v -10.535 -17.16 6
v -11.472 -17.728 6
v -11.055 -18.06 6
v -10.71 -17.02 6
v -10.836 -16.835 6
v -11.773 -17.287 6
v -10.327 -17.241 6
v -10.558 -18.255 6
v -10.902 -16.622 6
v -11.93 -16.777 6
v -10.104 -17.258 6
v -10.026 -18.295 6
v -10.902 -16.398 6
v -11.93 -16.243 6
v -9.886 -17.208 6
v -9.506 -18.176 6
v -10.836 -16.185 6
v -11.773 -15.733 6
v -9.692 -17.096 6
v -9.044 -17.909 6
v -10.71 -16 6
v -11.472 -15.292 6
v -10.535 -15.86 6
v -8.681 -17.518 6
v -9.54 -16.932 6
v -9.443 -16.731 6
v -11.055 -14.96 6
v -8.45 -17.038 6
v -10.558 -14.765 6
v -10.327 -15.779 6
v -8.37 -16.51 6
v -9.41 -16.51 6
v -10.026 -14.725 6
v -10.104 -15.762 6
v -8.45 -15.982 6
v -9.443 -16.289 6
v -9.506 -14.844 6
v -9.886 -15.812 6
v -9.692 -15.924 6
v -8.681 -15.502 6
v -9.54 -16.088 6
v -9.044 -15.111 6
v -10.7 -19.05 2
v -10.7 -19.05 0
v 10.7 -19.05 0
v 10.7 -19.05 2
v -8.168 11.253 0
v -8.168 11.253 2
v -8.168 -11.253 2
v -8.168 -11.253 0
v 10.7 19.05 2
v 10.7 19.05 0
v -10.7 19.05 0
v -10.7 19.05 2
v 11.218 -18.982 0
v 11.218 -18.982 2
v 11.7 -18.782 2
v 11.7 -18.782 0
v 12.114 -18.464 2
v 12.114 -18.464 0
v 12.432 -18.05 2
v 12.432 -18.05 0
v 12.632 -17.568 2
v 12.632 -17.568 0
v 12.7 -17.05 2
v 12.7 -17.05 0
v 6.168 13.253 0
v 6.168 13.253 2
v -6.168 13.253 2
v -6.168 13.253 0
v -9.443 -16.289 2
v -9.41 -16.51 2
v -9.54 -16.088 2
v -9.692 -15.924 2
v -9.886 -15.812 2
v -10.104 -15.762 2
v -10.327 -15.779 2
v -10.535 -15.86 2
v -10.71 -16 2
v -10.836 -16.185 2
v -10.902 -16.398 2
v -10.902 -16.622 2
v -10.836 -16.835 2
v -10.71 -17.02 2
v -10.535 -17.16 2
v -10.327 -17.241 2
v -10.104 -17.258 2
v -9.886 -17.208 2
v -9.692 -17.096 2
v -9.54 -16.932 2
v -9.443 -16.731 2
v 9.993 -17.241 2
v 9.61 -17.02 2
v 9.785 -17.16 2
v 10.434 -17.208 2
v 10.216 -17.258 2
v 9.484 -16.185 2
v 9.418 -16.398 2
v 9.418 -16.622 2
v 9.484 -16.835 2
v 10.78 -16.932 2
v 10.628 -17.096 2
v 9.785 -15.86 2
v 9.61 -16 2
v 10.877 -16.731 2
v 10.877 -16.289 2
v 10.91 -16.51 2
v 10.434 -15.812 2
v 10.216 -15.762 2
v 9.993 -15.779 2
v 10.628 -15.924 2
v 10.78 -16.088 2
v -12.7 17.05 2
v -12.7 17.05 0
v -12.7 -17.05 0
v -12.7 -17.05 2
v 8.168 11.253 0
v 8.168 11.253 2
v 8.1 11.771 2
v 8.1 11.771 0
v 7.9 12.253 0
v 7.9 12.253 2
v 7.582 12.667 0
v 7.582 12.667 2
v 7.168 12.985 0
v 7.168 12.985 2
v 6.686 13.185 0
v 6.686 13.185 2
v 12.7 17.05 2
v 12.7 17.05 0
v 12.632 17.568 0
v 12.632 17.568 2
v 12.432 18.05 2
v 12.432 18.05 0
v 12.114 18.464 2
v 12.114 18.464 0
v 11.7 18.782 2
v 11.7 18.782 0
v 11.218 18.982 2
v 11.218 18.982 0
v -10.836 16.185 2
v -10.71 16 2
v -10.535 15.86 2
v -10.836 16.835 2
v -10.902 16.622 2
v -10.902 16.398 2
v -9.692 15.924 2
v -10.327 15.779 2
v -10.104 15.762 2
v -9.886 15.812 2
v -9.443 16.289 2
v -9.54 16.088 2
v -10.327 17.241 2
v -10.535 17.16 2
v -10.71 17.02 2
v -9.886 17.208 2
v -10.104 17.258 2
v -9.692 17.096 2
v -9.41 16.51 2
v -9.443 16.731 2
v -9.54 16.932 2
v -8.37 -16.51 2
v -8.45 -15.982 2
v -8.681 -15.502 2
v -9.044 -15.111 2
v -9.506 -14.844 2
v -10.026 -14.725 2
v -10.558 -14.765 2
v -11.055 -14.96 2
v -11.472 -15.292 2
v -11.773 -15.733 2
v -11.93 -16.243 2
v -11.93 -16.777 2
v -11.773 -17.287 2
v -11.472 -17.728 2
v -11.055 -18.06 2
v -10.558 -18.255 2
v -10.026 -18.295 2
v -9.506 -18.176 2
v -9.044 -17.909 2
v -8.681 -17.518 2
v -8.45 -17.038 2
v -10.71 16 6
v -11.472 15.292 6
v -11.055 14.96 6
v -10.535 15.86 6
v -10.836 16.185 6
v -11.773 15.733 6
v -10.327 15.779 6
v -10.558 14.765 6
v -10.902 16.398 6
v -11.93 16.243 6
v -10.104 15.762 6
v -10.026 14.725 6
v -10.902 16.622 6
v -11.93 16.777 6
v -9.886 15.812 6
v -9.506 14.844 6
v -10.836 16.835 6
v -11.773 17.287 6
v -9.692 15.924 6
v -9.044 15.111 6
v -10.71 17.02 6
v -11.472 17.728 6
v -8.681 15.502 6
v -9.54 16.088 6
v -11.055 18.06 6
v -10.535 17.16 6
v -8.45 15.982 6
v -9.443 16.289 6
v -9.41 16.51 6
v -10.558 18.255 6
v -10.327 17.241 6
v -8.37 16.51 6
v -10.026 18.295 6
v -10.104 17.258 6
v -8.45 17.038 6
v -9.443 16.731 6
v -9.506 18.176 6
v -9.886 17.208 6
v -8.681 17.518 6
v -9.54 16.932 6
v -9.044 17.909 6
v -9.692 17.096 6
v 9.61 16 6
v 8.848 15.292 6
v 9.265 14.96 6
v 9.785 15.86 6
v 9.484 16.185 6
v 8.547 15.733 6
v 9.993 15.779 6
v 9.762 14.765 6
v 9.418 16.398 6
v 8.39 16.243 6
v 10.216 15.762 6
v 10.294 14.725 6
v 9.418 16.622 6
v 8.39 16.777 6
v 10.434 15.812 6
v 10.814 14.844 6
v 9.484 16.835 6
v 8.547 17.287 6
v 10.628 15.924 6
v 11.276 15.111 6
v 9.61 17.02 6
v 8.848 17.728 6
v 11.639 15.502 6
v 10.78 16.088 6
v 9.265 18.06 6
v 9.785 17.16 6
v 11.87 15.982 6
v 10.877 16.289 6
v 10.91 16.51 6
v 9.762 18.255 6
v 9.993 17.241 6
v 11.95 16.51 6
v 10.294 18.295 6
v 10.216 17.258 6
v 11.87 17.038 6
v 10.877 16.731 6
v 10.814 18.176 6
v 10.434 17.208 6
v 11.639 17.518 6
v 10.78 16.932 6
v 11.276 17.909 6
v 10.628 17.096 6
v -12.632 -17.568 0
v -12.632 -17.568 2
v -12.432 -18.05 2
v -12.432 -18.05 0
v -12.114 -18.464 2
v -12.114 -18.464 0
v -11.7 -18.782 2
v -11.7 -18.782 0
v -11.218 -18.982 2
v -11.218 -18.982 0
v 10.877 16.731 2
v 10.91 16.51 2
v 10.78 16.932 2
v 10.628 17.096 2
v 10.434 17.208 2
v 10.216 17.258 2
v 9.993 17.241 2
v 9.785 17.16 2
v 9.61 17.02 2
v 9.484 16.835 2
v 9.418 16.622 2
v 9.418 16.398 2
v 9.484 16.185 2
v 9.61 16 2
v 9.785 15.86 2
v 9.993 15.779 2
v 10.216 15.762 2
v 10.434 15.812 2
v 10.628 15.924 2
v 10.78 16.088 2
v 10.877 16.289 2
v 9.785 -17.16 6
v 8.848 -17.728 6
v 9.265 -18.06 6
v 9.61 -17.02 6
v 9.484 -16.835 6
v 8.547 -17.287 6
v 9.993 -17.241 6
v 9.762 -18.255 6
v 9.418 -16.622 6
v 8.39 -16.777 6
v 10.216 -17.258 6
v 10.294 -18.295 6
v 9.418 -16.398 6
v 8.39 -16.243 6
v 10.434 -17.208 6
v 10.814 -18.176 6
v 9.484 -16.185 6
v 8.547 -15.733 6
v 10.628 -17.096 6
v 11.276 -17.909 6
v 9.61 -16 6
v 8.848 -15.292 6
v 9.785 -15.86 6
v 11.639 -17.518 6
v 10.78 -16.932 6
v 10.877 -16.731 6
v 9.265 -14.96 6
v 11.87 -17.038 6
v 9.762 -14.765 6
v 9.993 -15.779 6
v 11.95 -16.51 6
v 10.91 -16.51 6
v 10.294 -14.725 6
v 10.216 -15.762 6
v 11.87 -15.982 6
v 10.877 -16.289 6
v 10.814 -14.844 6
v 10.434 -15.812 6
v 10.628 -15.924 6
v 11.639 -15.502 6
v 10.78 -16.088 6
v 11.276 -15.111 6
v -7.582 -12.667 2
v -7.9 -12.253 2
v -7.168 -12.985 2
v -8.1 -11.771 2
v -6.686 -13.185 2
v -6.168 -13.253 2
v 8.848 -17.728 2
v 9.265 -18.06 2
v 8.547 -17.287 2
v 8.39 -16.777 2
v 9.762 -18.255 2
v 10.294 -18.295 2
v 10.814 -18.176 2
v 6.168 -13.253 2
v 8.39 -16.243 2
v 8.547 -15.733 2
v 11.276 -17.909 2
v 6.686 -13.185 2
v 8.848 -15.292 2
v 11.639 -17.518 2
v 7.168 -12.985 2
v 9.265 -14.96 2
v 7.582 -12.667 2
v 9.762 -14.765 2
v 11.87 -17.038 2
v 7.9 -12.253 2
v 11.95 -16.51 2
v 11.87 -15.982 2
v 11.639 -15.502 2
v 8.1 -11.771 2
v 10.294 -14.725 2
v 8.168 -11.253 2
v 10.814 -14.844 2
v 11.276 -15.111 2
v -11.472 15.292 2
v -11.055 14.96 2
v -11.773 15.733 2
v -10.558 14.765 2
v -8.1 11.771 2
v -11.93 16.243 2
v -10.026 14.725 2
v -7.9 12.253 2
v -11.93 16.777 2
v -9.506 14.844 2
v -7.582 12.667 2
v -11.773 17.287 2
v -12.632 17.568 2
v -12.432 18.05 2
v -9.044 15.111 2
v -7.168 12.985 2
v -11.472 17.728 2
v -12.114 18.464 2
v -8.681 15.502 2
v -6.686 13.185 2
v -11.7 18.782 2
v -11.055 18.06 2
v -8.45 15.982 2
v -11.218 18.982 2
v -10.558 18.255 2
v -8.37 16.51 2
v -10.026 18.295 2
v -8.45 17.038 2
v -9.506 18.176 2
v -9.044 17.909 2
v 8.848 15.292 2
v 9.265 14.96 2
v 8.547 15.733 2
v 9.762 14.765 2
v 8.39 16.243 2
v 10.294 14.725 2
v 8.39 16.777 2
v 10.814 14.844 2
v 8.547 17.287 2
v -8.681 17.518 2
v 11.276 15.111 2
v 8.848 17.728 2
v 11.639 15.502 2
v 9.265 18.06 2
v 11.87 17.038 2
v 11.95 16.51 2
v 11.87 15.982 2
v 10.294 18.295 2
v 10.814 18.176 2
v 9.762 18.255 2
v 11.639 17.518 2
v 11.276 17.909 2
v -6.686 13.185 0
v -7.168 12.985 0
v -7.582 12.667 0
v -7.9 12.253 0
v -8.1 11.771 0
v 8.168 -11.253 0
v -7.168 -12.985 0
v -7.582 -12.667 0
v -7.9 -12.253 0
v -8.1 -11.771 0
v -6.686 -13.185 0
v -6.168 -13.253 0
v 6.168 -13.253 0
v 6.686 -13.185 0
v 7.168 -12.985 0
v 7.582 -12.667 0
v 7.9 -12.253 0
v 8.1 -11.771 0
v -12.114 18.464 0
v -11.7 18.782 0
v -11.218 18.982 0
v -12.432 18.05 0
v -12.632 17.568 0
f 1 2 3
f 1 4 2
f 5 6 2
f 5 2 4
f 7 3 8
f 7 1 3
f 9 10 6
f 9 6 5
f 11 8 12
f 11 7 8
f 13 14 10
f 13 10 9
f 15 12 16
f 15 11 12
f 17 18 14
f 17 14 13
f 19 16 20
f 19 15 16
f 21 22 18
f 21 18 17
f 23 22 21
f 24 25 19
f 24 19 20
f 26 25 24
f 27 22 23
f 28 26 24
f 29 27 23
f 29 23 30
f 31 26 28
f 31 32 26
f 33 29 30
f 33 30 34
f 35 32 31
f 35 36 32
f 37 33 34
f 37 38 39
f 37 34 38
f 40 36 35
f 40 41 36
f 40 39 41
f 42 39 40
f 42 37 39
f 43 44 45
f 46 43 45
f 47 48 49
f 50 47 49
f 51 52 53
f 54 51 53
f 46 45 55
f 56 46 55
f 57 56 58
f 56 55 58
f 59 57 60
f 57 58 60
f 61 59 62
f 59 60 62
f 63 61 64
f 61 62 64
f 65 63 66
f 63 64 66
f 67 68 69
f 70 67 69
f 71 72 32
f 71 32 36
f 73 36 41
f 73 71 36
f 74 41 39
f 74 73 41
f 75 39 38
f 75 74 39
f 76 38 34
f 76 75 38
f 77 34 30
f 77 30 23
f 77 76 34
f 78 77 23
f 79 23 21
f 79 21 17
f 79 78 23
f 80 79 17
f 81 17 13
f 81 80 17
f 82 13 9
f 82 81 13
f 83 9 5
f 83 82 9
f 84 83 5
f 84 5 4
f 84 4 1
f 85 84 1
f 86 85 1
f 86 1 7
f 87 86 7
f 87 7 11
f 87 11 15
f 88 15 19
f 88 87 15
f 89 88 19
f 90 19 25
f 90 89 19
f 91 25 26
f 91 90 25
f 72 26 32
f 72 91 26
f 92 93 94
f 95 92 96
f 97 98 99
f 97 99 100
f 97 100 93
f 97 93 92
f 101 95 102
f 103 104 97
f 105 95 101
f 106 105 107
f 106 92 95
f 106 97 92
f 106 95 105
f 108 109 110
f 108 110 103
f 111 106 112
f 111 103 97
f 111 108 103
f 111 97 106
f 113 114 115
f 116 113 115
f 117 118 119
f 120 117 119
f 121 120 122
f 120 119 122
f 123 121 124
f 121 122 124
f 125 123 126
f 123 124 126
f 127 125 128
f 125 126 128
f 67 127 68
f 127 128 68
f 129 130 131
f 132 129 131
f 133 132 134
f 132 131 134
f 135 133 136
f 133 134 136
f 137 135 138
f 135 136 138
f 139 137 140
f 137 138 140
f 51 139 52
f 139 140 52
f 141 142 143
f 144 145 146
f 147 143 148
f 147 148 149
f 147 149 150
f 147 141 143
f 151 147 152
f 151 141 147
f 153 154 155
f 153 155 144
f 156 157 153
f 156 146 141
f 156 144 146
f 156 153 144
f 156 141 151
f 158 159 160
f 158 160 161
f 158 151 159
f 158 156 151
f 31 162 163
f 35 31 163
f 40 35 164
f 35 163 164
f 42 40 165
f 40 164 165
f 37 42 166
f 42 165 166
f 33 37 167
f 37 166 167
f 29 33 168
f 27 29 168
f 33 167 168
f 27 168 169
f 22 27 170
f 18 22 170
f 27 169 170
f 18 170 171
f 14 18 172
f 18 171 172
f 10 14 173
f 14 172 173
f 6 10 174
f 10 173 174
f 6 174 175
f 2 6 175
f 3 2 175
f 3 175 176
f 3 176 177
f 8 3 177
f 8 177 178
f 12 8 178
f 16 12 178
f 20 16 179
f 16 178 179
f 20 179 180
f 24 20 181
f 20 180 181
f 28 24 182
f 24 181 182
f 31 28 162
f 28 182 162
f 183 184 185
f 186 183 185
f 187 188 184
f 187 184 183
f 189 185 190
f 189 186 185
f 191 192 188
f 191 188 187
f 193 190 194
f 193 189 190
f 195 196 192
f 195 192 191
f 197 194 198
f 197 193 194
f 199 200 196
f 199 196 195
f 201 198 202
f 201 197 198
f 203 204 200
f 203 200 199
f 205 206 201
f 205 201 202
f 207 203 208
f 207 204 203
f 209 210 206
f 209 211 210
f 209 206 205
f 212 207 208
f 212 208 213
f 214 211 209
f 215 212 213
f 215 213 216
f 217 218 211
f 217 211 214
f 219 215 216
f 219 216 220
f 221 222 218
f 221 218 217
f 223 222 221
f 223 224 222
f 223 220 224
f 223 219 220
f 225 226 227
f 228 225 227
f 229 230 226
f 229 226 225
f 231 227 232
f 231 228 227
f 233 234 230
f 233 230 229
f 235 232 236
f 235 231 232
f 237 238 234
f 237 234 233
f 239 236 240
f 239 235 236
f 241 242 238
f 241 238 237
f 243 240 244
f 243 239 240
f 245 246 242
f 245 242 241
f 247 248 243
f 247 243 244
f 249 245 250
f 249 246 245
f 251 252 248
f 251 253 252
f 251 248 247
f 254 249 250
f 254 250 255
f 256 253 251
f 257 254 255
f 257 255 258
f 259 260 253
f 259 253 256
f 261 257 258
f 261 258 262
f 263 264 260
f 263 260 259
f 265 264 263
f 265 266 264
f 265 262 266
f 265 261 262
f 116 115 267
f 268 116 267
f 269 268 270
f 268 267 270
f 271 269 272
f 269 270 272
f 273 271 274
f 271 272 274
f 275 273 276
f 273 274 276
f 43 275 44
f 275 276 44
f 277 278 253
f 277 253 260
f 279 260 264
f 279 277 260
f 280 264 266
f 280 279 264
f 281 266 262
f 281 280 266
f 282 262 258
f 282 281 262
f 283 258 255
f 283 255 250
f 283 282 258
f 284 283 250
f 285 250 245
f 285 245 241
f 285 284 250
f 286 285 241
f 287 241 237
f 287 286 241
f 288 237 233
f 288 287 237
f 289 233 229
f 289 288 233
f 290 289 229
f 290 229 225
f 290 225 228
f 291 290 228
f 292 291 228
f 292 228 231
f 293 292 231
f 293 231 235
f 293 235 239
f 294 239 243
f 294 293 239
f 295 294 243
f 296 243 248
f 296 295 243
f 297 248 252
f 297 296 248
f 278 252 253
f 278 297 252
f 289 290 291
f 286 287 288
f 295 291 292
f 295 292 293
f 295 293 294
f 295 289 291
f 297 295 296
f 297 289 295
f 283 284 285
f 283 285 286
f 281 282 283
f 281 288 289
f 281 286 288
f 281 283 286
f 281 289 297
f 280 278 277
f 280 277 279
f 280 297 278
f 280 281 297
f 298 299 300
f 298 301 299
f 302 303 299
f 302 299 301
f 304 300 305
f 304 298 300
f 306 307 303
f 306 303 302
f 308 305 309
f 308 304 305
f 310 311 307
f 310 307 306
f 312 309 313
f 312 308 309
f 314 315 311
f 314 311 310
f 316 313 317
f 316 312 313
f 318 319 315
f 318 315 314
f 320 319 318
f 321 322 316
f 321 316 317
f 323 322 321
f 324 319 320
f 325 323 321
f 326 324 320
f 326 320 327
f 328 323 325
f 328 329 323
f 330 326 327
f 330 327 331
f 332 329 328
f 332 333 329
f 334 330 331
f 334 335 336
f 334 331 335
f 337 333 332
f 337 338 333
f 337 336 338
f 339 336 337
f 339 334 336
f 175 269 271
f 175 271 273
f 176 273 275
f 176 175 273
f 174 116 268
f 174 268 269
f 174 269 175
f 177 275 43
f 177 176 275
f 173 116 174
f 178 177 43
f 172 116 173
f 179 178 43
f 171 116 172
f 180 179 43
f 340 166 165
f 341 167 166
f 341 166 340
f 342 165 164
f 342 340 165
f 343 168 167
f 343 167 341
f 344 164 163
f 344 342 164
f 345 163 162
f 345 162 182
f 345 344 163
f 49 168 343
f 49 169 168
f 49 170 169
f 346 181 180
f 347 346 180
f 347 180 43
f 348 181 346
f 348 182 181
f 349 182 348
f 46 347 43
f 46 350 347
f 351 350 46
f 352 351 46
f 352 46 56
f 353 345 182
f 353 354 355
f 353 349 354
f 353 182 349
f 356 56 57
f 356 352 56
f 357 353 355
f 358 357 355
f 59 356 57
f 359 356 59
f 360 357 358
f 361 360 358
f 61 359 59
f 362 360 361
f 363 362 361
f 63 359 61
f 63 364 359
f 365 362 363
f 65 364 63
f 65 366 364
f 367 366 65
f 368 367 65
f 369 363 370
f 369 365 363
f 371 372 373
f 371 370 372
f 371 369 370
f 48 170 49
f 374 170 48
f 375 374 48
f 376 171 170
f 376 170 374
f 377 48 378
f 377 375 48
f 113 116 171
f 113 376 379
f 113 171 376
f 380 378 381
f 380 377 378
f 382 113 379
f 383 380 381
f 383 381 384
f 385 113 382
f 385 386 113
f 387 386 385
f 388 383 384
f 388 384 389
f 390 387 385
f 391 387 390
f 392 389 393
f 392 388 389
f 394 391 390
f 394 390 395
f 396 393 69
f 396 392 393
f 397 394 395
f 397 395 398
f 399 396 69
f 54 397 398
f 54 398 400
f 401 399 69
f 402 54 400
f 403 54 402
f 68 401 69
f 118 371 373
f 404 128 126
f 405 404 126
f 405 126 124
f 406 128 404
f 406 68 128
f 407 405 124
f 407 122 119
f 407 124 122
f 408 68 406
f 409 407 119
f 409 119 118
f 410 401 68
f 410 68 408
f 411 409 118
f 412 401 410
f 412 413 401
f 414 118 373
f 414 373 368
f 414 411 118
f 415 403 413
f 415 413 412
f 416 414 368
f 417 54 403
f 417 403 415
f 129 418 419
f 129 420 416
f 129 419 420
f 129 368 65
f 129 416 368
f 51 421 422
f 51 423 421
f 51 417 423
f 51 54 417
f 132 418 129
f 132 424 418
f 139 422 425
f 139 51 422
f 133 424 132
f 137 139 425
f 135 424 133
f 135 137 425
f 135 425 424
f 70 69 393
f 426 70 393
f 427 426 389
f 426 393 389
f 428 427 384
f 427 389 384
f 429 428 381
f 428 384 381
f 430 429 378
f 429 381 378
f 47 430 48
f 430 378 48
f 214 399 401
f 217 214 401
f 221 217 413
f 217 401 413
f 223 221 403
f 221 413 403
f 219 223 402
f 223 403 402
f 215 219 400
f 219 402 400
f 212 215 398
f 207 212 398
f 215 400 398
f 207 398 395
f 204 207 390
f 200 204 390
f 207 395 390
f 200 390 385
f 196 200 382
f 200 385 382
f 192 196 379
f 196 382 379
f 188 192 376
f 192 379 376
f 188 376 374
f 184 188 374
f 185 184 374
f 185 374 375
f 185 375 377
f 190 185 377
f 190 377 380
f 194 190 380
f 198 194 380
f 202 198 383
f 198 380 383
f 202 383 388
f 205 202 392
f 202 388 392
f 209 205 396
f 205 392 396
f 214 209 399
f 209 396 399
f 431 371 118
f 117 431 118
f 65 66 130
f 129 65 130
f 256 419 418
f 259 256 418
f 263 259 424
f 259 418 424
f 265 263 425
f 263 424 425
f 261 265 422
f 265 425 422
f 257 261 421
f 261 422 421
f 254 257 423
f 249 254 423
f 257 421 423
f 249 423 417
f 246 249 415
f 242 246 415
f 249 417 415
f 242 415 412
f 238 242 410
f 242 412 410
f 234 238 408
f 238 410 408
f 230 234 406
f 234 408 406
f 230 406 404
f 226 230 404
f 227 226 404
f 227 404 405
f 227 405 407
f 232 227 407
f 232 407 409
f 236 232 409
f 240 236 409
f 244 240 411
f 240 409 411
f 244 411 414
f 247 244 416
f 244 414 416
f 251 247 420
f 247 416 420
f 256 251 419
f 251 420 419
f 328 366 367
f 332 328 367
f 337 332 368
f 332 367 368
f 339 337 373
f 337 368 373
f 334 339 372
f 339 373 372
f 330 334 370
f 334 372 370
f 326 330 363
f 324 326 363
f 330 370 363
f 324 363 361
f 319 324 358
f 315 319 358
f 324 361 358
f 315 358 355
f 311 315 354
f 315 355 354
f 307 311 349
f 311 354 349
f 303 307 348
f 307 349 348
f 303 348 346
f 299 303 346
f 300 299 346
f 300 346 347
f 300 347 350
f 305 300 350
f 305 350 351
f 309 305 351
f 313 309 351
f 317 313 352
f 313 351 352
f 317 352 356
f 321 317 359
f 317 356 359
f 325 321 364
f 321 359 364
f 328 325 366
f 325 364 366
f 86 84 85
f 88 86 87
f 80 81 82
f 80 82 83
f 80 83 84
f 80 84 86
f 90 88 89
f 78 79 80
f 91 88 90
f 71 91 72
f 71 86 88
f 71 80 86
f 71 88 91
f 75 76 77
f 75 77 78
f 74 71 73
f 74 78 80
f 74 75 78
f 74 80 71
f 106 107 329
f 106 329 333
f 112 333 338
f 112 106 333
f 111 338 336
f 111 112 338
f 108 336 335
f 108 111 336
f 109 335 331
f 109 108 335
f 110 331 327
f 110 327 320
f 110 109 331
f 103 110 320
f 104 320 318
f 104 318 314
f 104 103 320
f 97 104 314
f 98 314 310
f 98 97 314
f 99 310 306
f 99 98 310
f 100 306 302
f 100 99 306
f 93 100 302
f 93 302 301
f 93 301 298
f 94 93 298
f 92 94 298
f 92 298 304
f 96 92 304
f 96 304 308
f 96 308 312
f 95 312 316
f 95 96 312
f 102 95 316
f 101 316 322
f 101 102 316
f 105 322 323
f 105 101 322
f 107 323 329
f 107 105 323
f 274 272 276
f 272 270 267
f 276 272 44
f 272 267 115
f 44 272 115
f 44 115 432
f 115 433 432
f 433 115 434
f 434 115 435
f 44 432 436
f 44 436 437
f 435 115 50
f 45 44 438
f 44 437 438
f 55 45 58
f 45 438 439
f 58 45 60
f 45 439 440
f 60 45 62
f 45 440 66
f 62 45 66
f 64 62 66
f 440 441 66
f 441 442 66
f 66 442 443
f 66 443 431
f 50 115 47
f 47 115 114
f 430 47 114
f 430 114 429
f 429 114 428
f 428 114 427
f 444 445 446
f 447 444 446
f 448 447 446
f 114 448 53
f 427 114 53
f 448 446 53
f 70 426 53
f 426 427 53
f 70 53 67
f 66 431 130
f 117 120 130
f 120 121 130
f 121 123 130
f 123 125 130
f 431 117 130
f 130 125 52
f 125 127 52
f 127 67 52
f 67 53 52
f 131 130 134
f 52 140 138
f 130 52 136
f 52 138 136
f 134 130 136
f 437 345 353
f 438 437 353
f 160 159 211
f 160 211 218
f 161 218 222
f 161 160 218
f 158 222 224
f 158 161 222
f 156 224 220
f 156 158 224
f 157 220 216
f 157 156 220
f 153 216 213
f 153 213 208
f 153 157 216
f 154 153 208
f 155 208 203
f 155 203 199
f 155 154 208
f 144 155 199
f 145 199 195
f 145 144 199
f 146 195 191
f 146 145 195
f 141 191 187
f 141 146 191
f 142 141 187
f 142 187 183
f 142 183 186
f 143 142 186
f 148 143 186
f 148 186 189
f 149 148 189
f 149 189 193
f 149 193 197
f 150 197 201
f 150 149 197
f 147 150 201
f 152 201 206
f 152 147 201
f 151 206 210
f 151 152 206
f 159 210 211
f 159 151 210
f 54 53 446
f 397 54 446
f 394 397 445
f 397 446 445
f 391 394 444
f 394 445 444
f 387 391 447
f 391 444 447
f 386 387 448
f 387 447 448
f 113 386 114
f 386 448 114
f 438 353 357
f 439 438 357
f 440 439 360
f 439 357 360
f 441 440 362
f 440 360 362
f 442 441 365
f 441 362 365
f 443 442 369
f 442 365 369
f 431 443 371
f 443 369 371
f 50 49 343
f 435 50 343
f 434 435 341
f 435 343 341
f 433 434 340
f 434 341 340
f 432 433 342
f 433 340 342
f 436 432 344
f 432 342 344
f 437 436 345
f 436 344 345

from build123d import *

# Parameters (mm, degrees)
F1_DEPTH = 2
F2_R     = 1.79
F2_R_2   = 0.75
F3_DEPTH = 4
F5_DEPTH = 2


with BuildPart() as f1:
    # F0 (on Top) → F1 (new body)
    with BuildSketch(Plane.XY):
        with BuildLine():
            Line((10.7, 19.05), (-10.7, 19.05))
            ThreePointArc((-10.7, 19.05), (-12.114214, 18.464214), (-12.7, 17.05))
            Line((-12.7, 17.05), (-12.7, -17.05))
            ThreePointArc((-12.7, -17.05), (-12.114214, -18.464214), (-10.7, -19.05))
            Line((-10.7, -19.05), (10.7, -19.05))
            ThreePointArc((10.7, -19.05), (12.114214, -18.464214), (12.7, -17.05))
            Line((12.7, -17.05), (12.7, 17.05))
            ThreePointArc((12.7, 17.05), (12.114214, 18.464214), (10.7, 19.05))
        make_face()
    extrude(amount=F1_DEPTH)

    # F2 (on face) → F3 (join)
    with BuildSketch(Plane.XY.offset(2)):
        with Locations((-10.16, 16.51)):
            Circle(F2_R)
        with Locations((-10.16, 16.51)):
            Circle(F2_R_2, mode=Mode.SUBTRACT)
        with Locations((10.16, 16.51)):
            Circle(F2_R)
        with Locations((10.16, 16.51)):
            Circle(F2_R_2, mode=Mode.SUBTRACT)
        with Locations((10.16, -16.51)):
            Circle(F2_R)
        with Locations((10.16, -16.51)):
            Circle(F2_R_2, mode=Mode.SUBTRACT)
        with Locations((-10.16, -16.51)):
            Circle(F2_R)
        with Locations((-10.16, -16.51)):
            Circle(F2_R_2, mode=Mode.SUBTRACT)
    extrude(amount=F3_DEPTH)

    # F4 (on face) → F5 (cut)
    with BuildSketch(Plane.XY.offset(2)):
        with BuildLine():
            Line((6.168252, 13.253161), (-6.168252, 13.253161))
            ThreePointArc((-6.168252, 13.253161), (-7.582466, 12.667374), (-8.168252, 11.253161))
            Line((-8.168252, 11.253161), (-8.168252, -11.253161))
            ThreePointArc((-8.168252, -11.253161), (-7.582466, -12.667374), (-6.168252, -13.253161))
            Line((-6.168252, -13.253161), (6.168252, -13.253161))
            ThreePointArc((6.168252, -13.253161), (7.582466, -12.667374), (8.168252, -11.253161))
            Line((8.168252, -11.253161), (8.168252, 11.253161))
            ThreePointArc((8.168252, 11.253161), (7.582466, 12.667374), (6.168252, 13.253161))
        make_face()
    extrude(amount=-F5_DEPTH, mode=Mode.SUBTRACT)


solid = f1.part
